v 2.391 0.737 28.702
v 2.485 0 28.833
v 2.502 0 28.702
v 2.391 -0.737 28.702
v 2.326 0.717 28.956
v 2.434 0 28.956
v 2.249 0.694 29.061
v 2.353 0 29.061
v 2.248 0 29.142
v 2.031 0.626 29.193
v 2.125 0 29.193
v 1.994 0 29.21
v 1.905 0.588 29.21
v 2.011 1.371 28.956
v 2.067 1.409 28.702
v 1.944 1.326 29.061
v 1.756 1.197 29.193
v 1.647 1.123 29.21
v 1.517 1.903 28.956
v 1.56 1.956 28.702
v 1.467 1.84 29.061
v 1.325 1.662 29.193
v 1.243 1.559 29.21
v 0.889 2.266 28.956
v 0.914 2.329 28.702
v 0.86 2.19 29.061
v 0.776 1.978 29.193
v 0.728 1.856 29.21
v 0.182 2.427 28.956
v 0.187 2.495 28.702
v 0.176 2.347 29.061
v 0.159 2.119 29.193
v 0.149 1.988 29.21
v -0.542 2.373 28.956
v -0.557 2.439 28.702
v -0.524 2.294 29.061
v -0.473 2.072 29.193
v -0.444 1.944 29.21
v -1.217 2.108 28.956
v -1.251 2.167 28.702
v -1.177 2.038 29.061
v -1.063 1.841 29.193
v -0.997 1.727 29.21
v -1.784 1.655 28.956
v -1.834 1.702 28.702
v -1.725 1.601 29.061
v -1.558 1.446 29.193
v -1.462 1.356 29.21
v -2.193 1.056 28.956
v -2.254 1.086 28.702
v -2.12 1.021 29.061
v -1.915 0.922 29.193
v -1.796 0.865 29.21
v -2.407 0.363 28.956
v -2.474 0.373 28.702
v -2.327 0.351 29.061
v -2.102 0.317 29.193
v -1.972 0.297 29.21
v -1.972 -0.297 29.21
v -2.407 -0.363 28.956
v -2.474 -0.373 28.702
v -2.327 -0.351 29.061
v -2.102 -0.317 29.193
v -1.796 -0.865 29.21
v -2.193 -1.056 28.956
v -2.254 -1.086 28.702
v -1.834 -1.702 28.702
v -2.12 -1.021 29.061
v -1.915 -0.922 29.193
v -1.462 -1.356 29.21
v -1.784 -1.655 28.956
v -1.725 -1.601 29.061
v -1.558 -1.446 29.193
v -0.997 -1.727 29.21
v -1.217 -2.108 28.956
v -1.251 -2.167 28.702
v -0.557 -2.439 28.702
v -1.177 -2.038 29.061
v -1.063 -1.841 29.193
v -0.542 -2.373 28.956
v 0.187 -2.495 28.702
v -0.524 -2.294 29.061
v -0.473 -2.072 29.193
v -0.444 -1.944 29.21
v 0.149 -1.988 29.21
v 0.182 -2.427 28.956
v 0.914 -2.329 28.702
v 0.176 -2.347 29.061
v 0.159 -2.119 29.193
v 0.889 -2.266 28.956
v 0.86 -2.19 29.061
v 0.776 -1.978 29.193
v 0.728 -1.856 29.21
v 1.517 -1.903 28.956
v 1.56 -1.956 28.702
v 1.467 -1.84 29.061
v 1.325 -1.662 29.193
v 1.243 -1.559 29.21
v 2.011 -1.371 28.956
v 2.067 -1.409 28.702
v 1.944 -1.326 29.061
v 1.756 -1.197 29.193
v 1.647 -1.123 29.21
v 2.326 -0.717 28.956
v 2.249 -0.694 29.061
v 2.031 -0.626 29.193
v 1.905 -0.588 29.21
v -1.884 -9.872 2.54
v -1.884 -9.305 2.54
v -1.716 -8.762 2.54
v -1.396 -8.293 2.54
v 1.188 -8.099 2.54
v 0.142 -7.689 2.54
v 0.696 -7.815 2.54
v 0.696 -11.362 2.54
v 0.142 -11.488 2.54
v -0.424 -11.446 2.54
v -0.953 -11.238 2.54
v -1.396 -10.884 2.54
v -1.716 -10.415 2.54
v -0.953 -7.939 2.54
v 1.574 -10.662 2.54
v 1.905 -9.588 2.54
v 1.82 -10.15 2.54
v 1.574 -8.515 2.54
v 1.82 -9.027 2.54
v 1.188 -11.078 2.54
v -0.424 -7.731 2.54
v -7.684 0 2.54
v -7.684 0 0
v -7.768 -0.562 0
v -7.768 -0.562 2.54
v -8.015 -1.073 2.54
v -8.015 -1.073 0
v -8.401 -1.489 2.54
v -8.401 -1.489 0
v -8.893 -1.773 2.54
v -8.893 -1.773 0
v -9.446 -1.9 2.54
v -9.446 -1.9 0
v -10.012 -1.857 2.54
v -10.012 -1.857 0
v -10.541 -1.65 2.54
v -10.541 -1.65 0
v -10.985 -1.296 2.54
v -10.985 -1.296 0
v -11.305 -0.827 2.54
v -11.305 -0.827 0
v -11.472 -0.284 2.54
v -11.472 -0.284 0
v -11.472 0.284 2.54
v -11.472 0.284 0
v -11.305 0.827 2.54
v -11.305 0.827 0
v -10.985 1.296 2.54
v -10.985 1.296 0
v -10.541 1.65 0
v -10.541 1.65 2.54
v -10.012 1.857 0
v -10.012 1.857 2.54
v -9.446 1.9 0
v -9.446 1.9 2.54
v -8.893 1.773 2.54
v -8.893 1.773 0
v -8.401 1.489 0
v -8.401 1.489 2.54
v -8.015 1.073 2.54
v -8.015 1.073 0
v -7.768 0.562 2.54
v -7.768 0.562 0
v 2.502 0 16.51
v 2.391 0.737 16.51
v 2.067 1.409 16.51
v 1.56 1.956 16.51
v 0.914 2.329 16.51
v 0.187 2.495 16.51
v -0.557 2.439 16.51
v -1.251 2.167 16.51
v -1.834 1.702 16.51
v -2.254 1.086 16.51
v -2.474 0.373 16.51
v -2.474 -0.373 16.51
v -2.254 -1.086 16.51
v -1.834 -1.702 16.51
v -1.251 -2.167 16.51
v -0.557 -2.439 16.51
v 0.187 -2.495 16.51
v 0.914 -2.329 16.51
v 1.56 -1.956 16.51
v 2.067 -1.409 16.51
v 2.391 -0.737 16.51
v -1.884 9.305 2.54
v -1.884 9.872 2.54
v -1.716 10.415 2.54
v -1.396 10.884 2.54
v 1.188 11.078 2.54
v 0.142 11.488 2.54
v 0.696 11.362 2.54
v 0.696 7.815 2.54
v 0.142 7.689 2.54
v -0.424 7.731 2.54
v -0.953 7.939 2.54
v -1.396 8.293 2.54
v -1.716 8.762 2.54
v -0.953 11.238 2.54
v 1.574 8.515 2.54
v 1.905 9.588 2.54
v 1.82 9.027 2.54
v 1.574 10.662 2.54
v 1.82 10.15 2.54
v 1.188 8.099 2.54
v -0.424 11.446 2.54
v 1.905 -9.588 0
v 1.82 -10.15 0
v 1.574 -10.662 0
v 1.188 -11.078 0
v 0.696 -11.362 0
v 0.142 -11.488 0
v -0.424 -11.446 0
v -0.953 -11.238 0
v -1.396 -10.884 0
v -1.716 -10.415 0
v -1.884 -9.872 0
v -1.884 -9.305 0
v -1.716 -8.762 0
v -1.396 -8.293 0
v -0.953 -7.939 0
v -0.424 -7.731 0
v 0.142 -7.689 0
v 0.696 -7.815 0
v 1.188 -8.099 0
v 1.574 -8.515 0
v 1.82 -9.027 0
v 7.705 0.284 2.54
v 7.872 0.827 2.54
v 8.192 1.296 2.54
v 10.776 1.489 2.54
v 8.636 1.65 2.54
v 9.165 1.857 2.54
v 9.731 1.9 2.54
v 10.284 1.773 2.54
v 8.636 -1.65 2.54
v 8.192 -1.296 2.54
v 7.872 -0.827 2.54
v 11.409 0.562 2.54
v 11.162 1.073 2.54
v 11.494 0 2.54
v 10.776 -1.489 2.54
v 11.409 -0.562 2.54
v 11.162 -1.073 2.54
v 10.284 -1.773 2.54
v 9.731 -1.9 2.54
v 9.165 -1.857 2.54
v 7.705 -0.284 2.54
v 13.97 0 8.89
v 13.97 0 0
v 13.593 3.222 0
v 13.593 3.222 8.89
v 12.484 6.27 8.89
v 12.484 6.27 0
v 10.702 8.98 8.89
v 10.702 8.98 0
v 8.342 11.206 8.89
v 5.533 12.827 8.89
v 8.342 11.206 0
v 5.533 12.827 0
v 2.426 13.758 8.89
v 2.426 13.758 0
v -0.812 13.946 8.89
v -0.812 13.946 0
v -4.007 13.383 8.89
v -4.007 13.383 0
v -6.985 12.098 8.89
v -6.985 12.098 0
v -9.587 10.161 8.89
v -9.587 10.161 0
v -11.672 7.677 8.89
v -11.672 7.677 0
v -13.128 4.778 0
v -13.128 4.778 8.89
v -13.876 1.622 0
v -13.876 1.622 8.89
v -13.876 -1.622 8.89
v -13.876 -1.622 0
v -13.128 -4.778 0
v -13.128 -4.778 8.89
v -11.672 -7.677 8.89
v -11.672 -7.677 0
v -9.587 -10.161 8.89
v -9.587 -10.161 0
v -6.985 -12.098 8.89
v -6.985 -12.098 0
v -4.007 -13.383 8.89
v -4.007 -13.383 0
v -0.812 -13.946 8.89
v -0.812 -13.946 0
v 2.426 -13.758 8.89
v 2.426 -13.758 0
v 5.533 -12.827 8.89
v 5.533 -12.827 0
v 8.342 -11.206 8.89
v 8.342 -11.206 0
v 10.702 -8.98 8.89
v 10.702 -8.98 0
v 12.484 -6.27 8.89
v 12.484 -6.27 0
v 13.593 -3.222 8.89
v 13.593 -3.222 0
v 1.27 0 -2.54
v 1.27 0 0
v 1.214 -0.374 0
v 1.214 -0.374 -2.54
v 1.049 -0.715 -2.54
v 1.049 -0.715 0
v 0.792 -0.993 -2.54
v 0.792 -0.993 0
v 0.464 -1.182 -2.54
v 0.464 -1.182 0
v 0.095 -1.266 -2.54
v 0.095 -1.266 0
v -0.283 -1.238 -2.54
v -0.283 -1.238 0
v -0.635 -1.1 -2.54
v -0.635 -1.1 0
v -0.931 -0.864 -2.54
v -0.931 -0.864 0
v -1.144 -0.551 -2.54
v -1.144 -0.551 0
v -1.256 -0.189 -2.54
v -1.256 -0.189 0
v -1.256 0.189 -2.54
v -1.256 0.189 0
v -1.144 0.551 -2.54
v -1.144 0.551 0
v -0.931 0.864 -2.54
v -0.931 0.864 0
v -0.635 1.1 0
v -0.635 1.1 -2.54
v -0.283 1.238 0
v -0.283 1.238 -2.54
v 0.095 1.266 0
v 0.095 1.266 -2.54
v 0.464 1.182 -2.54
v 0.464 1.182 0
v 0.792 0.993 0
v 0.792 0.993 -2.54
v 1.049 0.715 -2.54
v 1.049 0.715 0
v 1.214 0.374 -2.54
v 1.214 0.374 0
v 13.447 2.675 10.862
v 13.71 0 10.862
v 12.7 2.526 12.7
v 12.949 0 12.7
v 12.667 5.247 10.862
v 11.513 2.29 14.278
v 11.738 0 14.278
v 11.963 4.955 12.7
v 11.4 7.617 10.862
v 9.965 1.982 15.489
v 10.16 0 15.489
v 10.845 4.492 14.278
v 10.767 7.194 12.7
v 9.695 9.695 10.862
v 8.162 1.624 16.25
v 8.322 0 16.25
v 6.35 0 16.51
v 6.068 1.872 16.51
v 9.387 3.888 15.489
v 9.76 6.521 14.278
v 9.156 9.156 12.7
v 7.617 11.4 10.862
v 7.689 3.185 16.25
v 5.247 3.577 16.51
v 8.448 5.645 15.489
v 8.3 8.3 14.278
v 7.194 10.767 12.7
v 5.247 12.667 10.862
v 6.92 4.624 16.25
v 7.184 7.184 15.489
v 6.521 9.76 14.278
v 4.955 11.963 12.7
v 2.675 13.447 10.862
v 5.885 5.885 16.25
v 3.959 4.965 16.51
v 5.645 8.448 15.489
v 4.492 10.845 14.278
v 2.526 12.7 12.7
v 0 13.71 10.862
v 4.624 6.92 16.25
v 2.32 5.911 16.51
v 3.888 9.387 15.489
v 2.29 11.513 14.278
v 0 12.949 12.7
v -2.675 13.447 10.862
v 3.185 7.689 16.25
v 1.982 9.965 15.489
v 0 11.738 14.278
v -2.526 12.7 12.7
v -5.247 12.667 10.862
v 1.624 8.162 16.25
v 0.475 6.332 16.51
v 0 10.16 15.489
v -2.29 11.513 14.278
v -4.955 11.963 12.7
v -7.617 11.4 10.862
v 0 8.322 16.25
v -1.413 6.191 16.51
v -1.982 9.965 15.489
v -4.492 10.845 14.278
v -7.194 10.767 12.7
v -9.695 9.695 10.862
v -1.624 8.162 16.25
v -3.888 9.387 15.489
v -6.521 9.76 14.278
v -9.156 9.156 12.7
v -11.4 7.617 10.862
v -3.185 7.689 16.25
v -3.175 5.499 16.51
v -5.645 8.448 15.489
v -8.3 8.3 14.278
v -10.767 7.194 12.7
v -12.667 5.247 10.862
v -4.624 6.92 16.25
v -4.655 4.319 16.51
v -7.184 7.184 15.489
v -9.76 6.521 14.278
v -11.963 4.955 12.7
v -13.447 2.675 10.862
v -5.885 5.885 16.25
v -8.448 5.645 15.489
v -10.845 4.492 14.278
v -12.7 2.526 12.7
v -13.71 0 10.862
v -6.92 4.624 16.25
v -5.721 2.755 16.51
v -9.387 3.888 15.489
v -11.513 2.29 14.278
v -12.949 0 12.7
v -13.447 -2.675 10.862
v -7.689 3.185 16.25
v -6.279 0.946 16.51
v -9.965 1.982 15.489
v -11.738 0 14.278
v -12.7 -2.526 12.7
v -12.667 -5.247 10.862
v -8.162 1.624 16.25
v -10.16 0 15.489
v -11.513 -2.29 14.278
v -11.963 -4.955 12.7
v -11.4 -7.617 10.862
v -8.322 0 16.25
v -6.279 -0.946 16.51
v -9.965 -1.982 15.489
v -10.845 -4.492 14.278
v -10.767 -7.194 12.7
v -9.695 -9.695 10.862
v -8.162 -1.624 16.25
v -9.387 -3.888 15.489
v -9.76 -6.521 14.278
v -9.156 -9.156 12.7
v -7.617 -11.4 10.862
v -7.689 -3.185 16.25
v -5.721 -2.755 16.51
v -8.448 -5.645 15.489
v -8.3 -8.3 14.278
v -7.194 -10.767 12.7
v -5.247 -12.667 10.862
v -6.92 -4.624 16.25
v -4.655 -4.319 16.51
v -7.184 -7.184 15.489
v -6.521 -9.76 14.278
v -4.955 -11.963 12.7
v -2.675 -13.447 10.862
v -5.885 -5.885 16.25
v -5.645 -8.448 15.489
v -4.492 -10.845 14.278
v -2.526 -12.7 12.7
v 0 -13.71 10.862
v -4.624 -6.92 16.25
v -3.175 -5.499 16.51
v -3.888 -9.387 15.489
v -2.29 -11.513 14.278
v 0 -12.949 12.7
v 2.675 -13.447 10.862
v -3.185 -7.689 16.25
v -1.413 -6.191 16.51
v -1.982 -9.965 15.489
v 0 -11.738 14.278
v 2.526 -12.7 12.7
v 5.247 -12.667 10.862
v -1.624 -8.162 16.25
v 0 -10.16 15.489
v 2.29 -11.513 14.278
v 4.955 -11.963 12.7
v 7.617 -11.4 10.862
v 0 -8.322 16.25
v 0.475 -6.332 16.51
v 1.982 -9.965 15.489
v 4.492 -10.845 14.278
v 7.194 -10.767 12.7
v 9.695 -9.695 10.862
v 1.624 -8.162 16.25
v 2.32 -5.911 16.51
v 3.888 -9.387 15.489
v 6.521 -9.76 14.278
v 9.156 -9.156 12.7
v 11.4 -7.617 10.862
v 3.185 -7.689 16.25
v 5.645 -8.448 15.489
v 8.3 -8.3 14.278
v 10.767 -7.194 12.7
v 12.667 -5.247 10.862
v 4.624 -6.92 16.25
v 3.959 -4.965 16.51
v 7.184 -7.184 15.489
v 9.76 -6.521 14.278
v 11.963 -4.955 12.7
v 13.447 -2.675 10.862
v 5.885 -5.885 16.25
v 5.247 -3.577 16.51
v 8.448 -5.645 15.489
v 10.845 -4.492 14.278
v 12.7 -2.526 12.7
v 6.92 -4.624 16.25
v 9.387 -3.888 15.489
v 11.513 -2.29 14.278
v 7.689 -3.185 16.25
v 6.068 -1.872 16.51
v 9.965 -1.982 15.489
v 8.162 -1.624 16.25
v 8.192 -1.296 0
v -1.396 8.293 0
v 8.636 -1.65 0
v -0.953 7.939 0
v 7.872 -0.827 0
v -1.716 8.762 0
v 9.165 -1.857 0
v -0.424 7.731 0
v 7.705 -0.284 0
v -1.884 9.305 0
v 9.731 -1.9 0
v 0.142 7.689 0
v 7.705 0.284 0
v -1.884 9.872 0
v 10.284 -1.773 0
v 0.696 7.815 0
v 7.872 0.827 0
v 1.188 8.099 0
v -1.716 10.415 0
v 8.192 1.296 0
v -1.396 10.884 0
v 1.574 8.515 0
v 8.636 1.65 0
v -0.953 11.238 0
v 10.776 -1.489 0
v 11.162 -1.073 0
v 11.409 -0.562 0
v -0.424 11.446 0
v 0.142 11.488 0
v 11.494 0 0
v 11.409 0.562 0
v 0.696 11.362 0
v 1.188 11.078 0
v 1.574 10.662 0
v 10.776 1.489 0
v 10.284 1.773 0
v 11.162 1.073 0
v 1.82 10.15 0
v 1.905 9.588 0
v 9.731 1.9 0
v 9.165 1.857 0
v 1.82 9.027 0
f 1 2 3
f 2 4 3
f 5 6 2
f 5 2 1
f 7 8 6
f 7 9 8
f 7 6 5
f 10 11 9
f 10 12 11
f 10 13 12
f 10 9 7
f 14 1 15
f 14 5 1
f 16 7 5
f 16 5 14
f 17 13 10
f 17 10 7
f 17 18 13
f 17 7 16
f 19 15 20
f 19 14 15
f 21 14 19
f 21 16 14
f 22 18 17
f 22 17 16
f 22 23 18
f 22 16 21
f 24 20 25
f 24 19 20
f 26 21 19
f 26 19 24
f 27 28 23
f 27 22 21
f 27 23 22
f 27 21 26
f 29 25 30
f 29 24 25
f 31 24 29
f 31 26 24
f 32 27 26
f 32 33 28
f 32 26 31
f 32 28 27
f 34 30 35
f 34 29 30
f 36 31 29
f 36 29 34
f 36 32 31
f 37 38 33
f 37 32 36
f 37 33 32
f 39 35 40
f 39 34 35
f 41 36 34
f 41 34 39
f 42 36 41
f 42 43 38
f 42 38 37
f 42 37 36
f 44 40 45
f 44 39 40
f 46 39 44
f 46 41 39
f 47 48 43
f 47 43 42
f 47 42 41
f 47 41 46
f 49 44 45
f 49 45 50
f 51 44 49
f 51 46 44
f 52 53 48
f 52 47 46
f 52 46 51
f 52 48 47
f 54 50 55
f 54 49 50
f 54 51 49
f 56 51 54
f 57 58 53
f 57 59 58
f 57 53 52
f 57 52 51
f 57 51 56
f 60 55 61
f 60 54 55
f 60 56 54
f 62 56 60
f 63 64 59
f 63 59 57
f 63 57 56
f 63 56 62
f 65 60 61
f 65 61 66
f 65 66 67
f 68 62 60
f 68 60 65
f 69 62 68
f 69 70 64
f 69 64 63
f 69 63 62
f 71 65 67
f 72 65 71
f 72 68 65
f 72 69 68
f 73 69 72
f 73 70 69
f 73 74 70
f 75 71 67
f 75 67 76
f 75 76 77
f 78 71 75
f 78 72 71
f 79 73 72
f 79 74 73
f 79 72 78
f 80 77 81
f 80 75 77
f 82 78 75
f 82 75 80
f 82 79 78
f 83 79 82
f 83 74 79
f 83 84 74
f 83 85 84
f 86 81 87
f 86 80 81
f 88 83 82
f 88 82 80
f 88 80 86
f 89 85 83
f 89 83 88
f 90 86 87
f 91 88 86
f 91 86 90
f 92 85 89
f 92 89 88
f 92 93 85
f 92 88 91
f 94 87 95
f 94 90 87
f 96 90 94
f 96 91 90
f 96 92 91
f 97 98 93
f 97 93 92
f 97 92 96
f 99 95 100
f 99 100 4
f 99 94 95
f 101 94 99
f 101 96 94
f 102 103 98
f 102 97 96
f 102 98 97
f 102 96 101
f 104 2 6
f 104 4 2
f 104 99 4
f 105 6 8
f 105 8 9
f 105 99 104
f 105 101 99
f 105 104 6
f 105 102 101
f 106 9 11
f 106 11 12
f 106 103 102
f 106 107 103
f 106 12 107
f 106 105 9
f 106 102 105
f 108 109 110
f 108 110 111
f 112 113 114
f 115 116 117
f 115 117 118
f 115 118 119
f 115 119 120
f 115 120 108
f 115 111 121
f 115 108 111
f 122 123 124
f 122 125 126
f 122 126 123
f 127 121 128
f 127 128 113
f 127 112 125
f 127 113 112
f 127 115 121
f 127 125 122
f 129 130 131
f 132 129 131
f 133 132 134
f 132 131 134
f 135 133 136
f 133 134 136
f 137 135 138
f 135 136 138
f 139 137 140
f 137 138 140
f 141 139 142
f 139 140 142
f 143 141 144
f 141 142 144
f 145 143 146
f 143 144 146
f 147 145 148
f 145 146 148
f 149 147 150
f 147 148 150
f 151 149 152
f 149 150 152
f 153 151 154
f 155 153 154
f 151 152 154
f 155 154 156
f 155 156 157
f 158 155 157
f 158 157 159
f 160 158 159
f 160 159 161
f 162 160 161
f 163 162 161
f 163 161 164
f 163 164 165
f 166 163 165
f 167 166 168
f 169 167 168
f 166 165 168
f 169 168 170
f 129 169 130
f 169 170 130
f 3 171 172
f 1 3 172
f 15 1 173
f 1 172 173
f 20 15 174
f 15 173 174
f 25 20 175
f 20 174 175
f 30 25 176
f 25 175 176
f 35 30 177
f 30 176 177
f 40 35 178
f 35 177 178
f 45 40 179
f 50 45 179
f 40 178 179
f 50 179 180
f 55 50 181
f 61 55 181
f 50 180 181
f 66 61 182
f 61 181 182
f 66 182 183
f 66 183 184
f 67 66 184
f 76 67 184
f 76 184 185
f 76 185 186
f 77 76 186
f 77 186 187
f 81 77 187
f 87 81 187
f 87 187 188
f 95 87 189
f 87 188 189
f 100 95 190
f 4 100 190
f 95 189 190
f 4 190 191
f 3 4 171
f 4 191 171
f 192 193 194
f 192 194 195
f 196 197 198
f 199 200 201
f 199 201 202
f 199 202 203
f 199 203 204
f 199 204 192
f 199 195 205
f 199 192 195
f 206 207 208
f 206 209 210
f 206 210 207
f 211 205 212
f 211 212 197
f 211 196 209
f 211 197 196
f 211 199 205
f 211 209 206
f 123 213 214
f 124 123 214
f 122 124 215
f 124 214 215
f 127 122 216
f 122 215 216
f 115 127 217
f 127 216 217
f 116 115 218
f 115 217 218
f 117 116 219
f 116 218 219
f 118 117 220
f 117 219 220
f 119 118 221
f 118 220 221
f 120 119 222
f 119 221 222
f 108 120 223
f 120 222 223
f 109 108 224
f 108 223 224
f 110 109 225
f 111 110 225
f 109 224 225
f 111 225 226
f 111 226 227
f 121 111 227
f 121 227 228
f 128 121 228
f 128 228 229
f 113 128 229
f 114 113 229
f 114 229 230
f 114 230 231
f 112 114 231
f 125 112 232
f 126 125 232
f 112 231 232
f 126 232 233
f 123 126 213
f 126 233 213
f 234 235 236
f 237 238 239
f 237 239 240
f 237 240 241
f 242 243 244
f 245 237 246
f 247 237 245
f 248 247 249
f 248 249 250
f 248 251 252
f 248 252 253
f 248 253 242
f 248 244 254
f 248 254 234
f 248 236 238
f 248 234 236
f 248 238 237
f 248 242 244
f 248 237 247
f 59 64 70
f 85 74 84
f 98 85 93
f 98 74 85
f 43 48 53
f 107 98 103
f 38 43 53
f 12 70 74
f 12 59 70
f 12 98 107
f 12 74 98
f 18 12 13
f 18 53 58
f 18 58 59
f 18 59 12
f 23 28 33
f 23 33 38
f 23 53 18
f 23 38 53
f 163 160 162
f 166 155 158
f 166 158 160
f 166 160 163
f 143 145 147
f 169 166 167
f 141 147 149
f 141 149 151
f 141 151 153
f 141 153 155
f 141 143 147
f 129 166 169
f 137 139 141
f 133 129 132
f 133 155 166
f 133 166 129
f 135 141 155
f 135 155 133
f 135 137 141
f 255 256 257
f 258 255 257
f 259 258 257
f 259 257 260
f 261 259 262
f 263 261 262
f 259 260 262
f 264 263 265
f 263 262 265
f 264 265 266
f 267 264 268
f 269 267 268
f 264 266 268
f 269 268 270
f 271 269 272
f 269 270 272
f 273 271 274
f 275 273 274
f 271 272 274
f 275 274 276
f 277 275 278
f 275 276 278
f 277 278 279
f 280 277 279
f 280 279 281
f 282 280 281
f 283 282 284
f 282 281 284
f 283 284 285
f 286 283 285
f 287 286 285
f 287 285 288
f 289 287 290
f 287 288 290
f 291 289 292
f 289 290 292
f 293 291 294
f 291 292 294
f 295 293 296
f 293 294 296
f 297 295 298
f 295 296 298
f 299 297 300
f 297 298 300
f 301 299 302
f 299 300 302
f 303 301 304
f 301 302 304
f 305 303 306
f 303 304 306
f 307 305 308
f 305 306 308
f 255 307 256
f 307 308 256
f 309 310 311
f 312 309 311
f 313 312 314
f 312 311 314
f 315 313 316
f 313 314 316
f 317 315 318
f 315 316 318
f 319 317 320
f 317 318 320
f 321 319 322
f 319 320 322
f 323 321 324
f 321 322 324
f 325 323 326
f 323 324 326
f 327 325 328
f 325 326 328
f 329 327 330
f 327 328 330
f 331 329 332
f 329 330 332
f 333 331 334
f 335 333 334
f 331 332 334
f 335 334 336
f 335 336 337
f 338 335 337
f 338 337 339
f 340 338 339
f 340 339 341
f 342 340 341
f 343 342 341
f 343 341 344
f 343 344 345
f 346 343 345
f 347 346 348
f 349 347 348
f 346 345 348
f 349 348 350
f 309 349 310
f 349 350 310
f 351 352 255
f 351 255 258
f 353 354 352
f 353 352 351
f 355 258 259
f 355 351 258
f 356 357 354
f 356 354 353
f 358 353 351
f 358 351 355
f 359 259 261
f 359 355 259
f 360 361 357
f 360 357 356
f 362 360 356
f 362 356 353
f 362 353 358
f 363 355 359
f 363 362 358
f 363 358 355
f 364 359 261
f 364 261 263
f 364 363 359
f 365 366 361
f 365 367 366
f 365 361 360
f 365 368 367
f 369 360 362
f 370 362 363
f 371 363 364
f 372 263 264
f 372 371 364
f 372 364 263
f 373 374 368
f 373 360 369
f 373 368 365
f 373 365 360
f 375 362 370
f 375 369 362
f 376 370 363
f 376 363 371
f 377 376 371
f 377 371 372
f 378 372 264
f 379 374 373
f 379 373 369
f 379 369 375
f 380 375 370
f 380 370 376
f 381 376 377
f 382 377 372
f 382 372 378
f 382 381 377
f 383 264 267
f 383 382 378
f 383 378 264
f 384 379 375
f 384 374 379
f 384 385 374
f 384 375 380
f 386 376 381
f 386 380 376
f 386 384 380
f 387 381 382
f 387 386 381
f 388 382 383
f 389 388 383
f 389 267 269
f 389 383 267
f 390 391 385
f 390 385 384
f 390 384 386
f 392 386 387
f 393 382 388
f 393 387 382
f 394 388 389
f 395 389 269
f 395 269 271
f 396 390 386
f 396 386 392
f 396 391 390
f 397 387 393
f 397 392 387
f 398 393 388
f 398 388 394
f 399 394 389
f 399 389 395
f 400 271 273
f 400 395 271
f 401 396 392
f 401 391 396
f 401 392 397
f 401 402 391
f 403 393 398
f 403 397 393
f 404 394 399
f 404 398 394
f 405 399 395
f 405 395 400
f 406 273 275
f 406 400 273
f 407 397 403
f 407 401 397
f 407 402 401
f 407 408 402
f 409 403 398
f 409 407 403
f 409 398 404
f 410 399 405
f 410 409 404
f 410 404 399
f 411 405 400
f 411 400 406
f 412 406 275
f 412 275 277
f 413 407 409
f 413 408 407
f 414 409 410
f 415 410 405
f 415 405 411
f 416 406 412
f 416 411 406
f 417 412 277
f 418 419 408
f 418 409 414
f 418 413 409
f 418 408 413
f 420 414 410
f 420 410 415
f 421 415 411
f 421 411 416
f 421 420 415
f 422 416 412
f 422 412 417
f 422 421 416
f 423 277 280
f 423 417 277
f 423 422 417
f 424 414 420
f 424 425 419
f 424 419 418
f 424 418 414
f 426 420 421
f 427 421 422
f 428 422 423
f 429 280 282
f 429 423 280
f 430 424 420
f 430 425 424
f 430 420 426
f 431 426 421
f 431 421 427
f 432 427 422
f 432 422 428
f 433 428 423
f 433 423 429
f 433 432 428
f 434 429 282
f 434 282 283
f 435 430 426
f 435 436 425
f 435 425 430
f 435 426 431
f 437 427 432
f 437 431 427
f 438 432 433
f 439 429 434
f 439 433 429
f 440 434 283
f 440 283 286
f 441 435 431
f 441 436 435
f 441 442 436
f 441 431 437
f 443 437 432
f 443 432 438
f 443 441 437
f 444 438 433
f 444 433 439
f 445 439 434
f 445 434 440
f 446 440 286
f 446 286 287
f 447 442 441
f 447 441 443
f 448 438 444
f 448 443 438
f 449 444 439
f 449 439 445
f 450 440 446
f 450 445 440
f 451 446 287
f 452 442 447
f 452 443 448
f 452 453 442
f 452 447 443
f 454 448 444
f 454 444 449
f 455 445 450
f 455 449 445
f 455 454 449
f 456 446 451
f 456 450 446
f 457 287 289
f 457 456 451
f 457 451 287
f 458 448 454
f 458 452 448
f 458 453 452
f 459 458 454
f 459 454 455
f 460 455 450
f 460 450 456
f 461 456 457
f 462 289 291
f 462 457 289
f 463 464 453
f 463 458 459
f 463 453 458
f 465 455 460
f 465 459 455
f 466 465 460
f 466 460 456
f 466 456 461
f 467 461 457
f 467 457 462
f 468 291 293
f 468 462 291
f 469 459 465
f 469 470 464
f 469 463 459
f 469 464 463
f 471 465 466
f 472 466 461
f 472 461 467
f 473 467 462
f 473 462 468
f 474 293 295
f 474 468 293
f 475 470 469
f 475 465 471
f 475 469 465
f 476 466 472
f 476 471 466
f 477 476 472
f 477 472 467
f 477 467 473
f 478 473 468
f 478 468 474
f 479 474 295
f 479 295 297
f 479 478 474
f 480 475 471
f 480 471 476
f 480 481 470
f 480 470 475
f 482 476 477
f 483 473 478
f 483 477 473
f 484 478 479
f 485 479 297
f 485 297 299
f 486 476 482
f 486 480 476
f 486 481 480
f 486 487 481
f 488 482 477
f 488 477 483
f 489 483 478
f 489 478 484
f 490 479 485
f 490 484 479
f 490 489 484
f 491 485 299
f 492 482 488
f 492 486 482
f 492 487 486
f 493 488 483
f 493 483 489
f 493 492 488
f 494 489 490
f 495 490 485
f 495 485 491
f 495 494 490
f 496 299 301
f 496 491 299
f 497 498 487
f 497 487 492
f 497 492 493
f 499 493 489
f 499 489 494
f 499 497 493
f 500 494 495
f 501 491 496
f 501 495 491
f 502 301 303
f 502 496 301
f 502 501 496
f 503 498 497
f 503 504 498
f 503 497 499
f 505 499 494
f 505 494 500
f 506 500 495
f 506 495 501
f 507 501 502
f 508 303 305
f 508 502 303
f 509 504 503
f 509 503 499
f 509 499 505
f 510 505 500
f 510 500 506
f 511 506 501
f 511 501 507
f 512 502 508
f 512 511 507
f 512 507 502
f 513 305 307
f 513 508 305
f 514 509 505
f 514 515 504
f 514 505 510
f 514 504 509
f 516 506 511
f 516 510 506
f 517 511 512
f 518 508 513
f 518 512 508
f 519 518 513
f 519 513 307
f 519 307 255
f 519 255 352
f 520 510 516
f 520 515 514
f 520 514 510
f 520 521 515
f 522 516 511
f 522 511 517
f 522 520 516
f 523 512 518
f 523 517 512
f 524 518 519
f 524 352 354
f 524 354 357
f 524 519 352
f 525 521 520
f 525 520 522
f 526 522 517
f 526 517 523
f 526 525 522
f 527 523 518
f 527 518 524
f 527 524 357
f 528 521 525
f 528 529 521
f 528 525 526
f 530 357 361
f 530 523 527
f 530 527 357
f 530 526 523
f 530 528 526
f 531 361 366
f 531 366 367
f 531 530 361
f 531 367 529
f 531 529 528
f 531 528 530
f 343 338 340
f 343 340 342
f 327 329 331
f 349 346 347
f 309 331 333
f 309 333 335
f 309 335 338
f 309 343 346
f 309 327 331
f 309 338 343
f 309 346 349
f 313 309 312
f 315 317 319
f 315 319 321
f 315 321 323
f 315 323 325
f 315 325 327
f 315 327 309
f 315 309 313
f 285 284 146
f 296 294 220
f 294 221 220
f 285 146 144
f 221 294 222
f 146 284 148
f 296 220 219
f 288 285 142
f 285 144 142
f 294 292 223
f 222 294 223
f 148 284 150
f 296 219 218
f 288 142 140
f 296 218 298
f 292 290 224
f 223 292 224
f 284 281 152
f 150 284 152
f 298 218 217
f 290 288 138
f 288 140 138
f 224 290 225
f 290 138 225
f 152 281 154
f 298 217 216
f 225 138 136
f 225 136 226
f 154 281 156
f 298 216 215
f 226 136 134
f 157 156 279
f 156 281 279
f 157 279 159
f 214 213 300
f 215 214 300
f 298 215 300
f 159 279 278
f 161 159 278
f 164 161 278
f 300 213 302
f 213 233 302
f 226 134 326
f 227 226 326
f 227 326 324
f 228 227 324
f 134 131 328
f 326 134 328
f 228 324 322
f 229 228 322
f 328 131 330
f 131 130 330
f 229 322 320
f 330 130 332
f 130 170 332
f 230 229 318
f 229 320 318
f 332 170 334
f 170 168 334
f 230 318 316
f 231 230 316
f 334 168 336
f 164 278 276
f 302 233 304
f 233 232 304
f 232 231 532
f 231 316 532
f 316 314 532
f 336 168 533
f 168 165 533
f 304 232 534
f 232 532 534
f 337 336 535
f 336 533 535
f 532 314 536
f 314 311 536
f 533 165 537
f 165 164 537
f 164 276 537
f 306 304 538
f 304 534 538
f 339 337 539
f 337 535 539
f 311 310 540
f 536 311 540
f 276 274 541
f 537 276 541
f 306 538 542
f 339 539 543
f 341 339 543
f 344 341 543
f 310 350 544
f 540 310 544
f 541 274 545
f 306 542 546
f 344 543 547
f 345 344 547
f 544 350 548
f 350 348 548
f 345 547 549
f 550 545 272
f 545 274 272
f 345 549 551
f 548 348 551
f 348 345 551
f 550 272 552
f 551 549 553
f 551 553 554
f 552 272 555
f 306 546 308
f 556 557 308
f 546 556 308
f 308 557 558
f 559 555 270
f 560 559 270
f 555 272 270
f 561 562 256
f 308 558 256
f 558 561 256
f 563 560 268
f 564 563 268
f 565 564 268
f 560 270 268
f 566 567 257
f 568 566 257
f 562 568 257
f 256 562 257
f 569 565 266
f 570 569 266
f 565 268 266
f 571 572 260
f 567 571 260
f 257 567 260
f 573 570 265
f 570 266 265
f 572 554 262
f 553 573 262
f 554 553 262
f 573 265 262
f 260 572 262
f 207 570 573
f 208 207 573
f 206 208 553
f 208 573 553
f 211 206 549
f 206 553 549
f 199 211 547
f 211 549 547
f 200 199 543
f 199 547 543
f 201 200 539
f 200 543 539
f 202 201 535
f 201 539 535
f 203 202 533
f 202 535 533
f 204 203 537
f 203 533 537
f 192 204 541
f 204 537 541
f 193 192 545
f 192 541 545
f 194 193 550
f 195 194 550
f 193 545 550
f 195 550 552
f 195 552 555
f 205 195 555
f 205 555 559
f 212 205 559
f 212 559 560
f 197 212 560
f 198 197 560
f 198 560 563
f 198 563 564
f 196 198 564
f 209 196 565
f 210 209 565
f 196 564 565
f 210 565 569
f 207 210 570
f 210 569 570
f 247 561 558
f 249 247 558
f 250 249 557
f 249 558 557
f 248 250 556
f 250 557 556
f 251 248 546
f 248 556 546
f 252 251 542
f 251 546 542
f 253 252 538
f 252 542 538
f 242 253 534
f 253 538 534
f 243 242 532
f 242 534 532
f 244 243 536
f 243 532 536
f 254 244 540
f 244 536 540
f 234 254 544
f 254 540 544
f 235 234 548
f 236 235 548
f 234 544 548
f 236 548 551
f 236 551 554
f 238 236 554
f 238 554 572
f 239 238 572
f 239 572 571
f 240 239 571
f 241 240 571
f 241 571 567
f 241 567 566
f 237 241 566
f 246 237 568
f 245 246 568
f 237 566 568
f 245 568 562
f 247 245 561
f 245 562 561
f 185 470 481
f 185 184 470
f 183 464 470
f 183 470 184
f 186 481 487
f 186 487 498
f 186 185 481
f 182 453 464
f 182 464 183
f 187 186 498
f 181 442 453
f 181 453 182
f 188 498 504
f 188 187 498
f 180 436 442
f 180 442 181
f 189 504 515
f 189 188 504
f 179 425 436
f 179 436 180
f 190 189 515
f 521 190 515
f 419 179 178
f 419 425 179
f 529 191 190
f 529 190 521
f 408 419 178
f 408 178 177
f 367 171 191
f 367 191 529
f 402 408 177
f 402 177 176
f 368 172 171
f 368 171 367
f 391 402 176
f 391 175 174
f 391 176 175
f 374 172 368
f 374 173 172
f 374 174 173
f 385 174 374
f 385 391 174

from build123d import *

# Parameters (mm, degrees)
F0_R     = 13.97
F1_DEPTH = 16.51
F2_R     = 7.62
F3_R     = 1.27
F4_DEPTH = 2.54
F5_R     = 1.905
F6_DEPTH = 2.54
F7_R     = 2.5019
F8_DEPTH = 12.7
F9_R     = 0.508


with BuildPart() as f1:
    # F0 (on Top) → F1 (new body)
    with BuildSketch(Plane.XY):
        Circle(F0_R)
    extrude(amount=F1_DEPTH)

    # F2
    f2_edges = [f1.edges().sort_by_distance(p)[0] for p in [
        (-13.97, 0, 16.51),
    ]]
    fillet(f2_edges, radius=F2_R)

    # F3 (on face) → F4 (join)
    with BuildSketch(Plane(origin=(0, 0, 0), x_dir=(1, 0, 0), z_dir=(0, 0, -1))):
        Circle(F3_R)
    extrude(amount=F4_DEPTH)

    # F5 (on face) → F6 (cut)
    with BuildSketch(Plane(origin=(0, 0, 0), x_dir=(1, 0, 0), z_dir=(0, 0, -1))):
        with Locations((-9.5885, 0)):
            Circle(F5_R)
        with Locations((0, -9.5885)):
            Circle(F5_R)
        with Locations((9.5885, 0)):
            Circle(F5_R)
        with Locations((0, 9.5885)):
            Circle(F5_R)
    extrude(amount=-F6_DEPTH, mode=Mode.SUBTRACT)

    # F7 (on face) → F8 (join)
    with BuildSketch(Plane.XY.offset(16.51)):
        Circle(F7_R)
    extrude(amount=F8_DEPTH)

    # F9
    f9_edges = [f1.edges().sort_by_distance(p)[0] for p in [
        (-2.5019, 0, 29.21),
    ]]
    fillet(f9_edges, radius=F9_R)


solid = f1.part
